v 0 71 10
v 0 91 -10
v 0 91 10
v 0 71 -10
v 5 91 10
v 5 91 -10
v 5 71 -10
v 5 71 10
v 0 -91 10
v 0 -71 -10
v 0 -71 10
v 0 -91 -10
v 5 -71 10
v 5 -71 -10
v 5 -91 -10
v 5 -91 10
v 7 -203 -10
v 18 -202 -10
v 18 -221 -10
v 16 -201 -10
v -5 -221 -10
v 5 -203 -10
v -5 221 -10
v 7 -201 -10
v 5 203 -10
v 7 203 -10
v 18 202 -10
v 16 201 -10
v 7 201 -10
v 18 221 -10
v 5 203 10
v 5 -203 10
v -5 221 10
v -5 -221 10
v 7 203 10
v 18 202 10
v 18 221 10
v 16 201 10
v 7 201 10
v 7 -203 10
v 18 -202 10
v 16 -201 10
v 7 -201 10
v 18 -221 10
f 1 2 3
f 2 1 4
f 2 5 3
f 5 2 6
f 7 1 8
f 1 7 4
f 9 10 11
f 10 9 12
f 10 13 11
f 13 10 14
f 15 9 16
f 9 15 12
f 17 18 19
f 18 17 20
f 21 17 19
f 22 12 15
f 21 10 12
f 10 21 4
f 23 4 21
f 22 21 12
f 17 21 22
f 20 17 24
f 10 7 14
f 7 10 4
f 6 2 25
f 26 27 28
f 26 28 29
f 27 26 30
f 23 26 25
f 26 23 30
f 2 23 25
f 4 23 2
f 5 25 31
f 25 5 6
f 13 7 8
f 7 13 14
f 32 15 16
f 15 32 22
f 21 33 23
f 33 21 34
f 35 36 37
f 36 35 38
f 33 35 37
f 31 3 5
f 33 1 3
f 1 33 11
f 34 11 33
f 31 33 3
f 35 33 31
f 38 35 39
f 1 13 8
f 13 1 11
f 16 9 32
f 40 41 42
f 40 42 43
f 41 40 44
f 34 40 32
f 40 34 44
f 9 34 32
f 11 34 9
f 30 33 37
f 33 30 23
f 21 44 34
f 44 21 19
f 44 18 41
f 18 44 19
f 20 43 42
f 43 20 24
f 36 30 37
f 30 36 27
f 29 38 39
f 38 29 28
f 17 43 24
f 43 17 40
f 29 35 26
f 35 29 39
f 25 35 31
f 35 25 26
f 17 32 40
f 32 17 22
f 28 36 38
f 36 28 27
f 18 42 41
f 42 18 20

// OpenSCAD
depth = 402;
width = 402;

thickness = 20;
height = 10;

total_bed_height = 11;
constrained_bed_height = 9;

center_square_size = 140;

heater_pad_gap = 2;

ease_in_width = 1;
ease_in_height = 2;

module bar(bar_length, interface_side, crossing_offsets)
{
  union()
  {
    difference()
    {
      cube([thickness, bar_length + 2 * thickness, height], center = true);
      
      for (crossing_offset = crossing_offsets)
      {
        translation = 
          + (crossing_offset == 0
             ? 0
             : sign(crossing_offset) * 0.5 * (center_square_size + thickness) + crossing_offset);
        
        translate([0, translation, height * 0.5 * interface_side])
        cube([2 * thickness, thickness, height], center = true);
      }
    }
    
    difference()
    {
      union()
      {
        translate([0, -bar_length * 0.5 - thickness * 0.5, 0.5 * total_bed_height + 0.5 * ease_in_height])
        cube([thickness, thickness, height + total_bed_height + ease_in_height], center = true);

        translate([0, bar_length * 0.5 + thickness * 0.5, 0.5 * total_bed_height + 0.5 * ease_in_height])
        cube([thickness, thickness, height + total_bed_height + ease_in_height], center = true);
      }
      
      translate([0, 0, 0.5 * height + 0.5 * (total_bed_height - constrained_bed_height)])
      cube([2 * thickness, bar_length + 2 * heater_pad_gap, total_bed_height - constrained_bed_height], center = true);
     
      translate([0, 0, 0.5 * height + total_bed_height])
      multmatrix(
        [[1, 0, 0, -thickness],
         [0, 1, ease_in_width / ease_in_height, -0.5 * bar_length],
         [0, 0, 1, 0],
         [0, 0, 0, 1]])
      {
        cube([2 * thickness, bar_length, ease_in_height]);
      }

      translate([0, 0, 0.5 * height + total_bed_height])
      multmatrix(
        [[1, 0, 0, -thickness],
         [0, 1, -ease_in_width / ease_in_height, -0.5 * bar_length],
         [0, 0, 1, 0],
         [0, 0, 0, 1]])
      {
        cube([2 * thickness, bar_length, ease_in_height]);
      }
    }
  }
}

rotate([0, 90, 0])
bar(depth, 1, [1, -1]);
//bar(width, -1, [10, -10]);
if ($preview)
{
  translate([0, -110, 0])
  cube([10, 10, 400], center = true);
  translate([0, 110, 0])
  cube([10, 10, 400], center = true);
}
